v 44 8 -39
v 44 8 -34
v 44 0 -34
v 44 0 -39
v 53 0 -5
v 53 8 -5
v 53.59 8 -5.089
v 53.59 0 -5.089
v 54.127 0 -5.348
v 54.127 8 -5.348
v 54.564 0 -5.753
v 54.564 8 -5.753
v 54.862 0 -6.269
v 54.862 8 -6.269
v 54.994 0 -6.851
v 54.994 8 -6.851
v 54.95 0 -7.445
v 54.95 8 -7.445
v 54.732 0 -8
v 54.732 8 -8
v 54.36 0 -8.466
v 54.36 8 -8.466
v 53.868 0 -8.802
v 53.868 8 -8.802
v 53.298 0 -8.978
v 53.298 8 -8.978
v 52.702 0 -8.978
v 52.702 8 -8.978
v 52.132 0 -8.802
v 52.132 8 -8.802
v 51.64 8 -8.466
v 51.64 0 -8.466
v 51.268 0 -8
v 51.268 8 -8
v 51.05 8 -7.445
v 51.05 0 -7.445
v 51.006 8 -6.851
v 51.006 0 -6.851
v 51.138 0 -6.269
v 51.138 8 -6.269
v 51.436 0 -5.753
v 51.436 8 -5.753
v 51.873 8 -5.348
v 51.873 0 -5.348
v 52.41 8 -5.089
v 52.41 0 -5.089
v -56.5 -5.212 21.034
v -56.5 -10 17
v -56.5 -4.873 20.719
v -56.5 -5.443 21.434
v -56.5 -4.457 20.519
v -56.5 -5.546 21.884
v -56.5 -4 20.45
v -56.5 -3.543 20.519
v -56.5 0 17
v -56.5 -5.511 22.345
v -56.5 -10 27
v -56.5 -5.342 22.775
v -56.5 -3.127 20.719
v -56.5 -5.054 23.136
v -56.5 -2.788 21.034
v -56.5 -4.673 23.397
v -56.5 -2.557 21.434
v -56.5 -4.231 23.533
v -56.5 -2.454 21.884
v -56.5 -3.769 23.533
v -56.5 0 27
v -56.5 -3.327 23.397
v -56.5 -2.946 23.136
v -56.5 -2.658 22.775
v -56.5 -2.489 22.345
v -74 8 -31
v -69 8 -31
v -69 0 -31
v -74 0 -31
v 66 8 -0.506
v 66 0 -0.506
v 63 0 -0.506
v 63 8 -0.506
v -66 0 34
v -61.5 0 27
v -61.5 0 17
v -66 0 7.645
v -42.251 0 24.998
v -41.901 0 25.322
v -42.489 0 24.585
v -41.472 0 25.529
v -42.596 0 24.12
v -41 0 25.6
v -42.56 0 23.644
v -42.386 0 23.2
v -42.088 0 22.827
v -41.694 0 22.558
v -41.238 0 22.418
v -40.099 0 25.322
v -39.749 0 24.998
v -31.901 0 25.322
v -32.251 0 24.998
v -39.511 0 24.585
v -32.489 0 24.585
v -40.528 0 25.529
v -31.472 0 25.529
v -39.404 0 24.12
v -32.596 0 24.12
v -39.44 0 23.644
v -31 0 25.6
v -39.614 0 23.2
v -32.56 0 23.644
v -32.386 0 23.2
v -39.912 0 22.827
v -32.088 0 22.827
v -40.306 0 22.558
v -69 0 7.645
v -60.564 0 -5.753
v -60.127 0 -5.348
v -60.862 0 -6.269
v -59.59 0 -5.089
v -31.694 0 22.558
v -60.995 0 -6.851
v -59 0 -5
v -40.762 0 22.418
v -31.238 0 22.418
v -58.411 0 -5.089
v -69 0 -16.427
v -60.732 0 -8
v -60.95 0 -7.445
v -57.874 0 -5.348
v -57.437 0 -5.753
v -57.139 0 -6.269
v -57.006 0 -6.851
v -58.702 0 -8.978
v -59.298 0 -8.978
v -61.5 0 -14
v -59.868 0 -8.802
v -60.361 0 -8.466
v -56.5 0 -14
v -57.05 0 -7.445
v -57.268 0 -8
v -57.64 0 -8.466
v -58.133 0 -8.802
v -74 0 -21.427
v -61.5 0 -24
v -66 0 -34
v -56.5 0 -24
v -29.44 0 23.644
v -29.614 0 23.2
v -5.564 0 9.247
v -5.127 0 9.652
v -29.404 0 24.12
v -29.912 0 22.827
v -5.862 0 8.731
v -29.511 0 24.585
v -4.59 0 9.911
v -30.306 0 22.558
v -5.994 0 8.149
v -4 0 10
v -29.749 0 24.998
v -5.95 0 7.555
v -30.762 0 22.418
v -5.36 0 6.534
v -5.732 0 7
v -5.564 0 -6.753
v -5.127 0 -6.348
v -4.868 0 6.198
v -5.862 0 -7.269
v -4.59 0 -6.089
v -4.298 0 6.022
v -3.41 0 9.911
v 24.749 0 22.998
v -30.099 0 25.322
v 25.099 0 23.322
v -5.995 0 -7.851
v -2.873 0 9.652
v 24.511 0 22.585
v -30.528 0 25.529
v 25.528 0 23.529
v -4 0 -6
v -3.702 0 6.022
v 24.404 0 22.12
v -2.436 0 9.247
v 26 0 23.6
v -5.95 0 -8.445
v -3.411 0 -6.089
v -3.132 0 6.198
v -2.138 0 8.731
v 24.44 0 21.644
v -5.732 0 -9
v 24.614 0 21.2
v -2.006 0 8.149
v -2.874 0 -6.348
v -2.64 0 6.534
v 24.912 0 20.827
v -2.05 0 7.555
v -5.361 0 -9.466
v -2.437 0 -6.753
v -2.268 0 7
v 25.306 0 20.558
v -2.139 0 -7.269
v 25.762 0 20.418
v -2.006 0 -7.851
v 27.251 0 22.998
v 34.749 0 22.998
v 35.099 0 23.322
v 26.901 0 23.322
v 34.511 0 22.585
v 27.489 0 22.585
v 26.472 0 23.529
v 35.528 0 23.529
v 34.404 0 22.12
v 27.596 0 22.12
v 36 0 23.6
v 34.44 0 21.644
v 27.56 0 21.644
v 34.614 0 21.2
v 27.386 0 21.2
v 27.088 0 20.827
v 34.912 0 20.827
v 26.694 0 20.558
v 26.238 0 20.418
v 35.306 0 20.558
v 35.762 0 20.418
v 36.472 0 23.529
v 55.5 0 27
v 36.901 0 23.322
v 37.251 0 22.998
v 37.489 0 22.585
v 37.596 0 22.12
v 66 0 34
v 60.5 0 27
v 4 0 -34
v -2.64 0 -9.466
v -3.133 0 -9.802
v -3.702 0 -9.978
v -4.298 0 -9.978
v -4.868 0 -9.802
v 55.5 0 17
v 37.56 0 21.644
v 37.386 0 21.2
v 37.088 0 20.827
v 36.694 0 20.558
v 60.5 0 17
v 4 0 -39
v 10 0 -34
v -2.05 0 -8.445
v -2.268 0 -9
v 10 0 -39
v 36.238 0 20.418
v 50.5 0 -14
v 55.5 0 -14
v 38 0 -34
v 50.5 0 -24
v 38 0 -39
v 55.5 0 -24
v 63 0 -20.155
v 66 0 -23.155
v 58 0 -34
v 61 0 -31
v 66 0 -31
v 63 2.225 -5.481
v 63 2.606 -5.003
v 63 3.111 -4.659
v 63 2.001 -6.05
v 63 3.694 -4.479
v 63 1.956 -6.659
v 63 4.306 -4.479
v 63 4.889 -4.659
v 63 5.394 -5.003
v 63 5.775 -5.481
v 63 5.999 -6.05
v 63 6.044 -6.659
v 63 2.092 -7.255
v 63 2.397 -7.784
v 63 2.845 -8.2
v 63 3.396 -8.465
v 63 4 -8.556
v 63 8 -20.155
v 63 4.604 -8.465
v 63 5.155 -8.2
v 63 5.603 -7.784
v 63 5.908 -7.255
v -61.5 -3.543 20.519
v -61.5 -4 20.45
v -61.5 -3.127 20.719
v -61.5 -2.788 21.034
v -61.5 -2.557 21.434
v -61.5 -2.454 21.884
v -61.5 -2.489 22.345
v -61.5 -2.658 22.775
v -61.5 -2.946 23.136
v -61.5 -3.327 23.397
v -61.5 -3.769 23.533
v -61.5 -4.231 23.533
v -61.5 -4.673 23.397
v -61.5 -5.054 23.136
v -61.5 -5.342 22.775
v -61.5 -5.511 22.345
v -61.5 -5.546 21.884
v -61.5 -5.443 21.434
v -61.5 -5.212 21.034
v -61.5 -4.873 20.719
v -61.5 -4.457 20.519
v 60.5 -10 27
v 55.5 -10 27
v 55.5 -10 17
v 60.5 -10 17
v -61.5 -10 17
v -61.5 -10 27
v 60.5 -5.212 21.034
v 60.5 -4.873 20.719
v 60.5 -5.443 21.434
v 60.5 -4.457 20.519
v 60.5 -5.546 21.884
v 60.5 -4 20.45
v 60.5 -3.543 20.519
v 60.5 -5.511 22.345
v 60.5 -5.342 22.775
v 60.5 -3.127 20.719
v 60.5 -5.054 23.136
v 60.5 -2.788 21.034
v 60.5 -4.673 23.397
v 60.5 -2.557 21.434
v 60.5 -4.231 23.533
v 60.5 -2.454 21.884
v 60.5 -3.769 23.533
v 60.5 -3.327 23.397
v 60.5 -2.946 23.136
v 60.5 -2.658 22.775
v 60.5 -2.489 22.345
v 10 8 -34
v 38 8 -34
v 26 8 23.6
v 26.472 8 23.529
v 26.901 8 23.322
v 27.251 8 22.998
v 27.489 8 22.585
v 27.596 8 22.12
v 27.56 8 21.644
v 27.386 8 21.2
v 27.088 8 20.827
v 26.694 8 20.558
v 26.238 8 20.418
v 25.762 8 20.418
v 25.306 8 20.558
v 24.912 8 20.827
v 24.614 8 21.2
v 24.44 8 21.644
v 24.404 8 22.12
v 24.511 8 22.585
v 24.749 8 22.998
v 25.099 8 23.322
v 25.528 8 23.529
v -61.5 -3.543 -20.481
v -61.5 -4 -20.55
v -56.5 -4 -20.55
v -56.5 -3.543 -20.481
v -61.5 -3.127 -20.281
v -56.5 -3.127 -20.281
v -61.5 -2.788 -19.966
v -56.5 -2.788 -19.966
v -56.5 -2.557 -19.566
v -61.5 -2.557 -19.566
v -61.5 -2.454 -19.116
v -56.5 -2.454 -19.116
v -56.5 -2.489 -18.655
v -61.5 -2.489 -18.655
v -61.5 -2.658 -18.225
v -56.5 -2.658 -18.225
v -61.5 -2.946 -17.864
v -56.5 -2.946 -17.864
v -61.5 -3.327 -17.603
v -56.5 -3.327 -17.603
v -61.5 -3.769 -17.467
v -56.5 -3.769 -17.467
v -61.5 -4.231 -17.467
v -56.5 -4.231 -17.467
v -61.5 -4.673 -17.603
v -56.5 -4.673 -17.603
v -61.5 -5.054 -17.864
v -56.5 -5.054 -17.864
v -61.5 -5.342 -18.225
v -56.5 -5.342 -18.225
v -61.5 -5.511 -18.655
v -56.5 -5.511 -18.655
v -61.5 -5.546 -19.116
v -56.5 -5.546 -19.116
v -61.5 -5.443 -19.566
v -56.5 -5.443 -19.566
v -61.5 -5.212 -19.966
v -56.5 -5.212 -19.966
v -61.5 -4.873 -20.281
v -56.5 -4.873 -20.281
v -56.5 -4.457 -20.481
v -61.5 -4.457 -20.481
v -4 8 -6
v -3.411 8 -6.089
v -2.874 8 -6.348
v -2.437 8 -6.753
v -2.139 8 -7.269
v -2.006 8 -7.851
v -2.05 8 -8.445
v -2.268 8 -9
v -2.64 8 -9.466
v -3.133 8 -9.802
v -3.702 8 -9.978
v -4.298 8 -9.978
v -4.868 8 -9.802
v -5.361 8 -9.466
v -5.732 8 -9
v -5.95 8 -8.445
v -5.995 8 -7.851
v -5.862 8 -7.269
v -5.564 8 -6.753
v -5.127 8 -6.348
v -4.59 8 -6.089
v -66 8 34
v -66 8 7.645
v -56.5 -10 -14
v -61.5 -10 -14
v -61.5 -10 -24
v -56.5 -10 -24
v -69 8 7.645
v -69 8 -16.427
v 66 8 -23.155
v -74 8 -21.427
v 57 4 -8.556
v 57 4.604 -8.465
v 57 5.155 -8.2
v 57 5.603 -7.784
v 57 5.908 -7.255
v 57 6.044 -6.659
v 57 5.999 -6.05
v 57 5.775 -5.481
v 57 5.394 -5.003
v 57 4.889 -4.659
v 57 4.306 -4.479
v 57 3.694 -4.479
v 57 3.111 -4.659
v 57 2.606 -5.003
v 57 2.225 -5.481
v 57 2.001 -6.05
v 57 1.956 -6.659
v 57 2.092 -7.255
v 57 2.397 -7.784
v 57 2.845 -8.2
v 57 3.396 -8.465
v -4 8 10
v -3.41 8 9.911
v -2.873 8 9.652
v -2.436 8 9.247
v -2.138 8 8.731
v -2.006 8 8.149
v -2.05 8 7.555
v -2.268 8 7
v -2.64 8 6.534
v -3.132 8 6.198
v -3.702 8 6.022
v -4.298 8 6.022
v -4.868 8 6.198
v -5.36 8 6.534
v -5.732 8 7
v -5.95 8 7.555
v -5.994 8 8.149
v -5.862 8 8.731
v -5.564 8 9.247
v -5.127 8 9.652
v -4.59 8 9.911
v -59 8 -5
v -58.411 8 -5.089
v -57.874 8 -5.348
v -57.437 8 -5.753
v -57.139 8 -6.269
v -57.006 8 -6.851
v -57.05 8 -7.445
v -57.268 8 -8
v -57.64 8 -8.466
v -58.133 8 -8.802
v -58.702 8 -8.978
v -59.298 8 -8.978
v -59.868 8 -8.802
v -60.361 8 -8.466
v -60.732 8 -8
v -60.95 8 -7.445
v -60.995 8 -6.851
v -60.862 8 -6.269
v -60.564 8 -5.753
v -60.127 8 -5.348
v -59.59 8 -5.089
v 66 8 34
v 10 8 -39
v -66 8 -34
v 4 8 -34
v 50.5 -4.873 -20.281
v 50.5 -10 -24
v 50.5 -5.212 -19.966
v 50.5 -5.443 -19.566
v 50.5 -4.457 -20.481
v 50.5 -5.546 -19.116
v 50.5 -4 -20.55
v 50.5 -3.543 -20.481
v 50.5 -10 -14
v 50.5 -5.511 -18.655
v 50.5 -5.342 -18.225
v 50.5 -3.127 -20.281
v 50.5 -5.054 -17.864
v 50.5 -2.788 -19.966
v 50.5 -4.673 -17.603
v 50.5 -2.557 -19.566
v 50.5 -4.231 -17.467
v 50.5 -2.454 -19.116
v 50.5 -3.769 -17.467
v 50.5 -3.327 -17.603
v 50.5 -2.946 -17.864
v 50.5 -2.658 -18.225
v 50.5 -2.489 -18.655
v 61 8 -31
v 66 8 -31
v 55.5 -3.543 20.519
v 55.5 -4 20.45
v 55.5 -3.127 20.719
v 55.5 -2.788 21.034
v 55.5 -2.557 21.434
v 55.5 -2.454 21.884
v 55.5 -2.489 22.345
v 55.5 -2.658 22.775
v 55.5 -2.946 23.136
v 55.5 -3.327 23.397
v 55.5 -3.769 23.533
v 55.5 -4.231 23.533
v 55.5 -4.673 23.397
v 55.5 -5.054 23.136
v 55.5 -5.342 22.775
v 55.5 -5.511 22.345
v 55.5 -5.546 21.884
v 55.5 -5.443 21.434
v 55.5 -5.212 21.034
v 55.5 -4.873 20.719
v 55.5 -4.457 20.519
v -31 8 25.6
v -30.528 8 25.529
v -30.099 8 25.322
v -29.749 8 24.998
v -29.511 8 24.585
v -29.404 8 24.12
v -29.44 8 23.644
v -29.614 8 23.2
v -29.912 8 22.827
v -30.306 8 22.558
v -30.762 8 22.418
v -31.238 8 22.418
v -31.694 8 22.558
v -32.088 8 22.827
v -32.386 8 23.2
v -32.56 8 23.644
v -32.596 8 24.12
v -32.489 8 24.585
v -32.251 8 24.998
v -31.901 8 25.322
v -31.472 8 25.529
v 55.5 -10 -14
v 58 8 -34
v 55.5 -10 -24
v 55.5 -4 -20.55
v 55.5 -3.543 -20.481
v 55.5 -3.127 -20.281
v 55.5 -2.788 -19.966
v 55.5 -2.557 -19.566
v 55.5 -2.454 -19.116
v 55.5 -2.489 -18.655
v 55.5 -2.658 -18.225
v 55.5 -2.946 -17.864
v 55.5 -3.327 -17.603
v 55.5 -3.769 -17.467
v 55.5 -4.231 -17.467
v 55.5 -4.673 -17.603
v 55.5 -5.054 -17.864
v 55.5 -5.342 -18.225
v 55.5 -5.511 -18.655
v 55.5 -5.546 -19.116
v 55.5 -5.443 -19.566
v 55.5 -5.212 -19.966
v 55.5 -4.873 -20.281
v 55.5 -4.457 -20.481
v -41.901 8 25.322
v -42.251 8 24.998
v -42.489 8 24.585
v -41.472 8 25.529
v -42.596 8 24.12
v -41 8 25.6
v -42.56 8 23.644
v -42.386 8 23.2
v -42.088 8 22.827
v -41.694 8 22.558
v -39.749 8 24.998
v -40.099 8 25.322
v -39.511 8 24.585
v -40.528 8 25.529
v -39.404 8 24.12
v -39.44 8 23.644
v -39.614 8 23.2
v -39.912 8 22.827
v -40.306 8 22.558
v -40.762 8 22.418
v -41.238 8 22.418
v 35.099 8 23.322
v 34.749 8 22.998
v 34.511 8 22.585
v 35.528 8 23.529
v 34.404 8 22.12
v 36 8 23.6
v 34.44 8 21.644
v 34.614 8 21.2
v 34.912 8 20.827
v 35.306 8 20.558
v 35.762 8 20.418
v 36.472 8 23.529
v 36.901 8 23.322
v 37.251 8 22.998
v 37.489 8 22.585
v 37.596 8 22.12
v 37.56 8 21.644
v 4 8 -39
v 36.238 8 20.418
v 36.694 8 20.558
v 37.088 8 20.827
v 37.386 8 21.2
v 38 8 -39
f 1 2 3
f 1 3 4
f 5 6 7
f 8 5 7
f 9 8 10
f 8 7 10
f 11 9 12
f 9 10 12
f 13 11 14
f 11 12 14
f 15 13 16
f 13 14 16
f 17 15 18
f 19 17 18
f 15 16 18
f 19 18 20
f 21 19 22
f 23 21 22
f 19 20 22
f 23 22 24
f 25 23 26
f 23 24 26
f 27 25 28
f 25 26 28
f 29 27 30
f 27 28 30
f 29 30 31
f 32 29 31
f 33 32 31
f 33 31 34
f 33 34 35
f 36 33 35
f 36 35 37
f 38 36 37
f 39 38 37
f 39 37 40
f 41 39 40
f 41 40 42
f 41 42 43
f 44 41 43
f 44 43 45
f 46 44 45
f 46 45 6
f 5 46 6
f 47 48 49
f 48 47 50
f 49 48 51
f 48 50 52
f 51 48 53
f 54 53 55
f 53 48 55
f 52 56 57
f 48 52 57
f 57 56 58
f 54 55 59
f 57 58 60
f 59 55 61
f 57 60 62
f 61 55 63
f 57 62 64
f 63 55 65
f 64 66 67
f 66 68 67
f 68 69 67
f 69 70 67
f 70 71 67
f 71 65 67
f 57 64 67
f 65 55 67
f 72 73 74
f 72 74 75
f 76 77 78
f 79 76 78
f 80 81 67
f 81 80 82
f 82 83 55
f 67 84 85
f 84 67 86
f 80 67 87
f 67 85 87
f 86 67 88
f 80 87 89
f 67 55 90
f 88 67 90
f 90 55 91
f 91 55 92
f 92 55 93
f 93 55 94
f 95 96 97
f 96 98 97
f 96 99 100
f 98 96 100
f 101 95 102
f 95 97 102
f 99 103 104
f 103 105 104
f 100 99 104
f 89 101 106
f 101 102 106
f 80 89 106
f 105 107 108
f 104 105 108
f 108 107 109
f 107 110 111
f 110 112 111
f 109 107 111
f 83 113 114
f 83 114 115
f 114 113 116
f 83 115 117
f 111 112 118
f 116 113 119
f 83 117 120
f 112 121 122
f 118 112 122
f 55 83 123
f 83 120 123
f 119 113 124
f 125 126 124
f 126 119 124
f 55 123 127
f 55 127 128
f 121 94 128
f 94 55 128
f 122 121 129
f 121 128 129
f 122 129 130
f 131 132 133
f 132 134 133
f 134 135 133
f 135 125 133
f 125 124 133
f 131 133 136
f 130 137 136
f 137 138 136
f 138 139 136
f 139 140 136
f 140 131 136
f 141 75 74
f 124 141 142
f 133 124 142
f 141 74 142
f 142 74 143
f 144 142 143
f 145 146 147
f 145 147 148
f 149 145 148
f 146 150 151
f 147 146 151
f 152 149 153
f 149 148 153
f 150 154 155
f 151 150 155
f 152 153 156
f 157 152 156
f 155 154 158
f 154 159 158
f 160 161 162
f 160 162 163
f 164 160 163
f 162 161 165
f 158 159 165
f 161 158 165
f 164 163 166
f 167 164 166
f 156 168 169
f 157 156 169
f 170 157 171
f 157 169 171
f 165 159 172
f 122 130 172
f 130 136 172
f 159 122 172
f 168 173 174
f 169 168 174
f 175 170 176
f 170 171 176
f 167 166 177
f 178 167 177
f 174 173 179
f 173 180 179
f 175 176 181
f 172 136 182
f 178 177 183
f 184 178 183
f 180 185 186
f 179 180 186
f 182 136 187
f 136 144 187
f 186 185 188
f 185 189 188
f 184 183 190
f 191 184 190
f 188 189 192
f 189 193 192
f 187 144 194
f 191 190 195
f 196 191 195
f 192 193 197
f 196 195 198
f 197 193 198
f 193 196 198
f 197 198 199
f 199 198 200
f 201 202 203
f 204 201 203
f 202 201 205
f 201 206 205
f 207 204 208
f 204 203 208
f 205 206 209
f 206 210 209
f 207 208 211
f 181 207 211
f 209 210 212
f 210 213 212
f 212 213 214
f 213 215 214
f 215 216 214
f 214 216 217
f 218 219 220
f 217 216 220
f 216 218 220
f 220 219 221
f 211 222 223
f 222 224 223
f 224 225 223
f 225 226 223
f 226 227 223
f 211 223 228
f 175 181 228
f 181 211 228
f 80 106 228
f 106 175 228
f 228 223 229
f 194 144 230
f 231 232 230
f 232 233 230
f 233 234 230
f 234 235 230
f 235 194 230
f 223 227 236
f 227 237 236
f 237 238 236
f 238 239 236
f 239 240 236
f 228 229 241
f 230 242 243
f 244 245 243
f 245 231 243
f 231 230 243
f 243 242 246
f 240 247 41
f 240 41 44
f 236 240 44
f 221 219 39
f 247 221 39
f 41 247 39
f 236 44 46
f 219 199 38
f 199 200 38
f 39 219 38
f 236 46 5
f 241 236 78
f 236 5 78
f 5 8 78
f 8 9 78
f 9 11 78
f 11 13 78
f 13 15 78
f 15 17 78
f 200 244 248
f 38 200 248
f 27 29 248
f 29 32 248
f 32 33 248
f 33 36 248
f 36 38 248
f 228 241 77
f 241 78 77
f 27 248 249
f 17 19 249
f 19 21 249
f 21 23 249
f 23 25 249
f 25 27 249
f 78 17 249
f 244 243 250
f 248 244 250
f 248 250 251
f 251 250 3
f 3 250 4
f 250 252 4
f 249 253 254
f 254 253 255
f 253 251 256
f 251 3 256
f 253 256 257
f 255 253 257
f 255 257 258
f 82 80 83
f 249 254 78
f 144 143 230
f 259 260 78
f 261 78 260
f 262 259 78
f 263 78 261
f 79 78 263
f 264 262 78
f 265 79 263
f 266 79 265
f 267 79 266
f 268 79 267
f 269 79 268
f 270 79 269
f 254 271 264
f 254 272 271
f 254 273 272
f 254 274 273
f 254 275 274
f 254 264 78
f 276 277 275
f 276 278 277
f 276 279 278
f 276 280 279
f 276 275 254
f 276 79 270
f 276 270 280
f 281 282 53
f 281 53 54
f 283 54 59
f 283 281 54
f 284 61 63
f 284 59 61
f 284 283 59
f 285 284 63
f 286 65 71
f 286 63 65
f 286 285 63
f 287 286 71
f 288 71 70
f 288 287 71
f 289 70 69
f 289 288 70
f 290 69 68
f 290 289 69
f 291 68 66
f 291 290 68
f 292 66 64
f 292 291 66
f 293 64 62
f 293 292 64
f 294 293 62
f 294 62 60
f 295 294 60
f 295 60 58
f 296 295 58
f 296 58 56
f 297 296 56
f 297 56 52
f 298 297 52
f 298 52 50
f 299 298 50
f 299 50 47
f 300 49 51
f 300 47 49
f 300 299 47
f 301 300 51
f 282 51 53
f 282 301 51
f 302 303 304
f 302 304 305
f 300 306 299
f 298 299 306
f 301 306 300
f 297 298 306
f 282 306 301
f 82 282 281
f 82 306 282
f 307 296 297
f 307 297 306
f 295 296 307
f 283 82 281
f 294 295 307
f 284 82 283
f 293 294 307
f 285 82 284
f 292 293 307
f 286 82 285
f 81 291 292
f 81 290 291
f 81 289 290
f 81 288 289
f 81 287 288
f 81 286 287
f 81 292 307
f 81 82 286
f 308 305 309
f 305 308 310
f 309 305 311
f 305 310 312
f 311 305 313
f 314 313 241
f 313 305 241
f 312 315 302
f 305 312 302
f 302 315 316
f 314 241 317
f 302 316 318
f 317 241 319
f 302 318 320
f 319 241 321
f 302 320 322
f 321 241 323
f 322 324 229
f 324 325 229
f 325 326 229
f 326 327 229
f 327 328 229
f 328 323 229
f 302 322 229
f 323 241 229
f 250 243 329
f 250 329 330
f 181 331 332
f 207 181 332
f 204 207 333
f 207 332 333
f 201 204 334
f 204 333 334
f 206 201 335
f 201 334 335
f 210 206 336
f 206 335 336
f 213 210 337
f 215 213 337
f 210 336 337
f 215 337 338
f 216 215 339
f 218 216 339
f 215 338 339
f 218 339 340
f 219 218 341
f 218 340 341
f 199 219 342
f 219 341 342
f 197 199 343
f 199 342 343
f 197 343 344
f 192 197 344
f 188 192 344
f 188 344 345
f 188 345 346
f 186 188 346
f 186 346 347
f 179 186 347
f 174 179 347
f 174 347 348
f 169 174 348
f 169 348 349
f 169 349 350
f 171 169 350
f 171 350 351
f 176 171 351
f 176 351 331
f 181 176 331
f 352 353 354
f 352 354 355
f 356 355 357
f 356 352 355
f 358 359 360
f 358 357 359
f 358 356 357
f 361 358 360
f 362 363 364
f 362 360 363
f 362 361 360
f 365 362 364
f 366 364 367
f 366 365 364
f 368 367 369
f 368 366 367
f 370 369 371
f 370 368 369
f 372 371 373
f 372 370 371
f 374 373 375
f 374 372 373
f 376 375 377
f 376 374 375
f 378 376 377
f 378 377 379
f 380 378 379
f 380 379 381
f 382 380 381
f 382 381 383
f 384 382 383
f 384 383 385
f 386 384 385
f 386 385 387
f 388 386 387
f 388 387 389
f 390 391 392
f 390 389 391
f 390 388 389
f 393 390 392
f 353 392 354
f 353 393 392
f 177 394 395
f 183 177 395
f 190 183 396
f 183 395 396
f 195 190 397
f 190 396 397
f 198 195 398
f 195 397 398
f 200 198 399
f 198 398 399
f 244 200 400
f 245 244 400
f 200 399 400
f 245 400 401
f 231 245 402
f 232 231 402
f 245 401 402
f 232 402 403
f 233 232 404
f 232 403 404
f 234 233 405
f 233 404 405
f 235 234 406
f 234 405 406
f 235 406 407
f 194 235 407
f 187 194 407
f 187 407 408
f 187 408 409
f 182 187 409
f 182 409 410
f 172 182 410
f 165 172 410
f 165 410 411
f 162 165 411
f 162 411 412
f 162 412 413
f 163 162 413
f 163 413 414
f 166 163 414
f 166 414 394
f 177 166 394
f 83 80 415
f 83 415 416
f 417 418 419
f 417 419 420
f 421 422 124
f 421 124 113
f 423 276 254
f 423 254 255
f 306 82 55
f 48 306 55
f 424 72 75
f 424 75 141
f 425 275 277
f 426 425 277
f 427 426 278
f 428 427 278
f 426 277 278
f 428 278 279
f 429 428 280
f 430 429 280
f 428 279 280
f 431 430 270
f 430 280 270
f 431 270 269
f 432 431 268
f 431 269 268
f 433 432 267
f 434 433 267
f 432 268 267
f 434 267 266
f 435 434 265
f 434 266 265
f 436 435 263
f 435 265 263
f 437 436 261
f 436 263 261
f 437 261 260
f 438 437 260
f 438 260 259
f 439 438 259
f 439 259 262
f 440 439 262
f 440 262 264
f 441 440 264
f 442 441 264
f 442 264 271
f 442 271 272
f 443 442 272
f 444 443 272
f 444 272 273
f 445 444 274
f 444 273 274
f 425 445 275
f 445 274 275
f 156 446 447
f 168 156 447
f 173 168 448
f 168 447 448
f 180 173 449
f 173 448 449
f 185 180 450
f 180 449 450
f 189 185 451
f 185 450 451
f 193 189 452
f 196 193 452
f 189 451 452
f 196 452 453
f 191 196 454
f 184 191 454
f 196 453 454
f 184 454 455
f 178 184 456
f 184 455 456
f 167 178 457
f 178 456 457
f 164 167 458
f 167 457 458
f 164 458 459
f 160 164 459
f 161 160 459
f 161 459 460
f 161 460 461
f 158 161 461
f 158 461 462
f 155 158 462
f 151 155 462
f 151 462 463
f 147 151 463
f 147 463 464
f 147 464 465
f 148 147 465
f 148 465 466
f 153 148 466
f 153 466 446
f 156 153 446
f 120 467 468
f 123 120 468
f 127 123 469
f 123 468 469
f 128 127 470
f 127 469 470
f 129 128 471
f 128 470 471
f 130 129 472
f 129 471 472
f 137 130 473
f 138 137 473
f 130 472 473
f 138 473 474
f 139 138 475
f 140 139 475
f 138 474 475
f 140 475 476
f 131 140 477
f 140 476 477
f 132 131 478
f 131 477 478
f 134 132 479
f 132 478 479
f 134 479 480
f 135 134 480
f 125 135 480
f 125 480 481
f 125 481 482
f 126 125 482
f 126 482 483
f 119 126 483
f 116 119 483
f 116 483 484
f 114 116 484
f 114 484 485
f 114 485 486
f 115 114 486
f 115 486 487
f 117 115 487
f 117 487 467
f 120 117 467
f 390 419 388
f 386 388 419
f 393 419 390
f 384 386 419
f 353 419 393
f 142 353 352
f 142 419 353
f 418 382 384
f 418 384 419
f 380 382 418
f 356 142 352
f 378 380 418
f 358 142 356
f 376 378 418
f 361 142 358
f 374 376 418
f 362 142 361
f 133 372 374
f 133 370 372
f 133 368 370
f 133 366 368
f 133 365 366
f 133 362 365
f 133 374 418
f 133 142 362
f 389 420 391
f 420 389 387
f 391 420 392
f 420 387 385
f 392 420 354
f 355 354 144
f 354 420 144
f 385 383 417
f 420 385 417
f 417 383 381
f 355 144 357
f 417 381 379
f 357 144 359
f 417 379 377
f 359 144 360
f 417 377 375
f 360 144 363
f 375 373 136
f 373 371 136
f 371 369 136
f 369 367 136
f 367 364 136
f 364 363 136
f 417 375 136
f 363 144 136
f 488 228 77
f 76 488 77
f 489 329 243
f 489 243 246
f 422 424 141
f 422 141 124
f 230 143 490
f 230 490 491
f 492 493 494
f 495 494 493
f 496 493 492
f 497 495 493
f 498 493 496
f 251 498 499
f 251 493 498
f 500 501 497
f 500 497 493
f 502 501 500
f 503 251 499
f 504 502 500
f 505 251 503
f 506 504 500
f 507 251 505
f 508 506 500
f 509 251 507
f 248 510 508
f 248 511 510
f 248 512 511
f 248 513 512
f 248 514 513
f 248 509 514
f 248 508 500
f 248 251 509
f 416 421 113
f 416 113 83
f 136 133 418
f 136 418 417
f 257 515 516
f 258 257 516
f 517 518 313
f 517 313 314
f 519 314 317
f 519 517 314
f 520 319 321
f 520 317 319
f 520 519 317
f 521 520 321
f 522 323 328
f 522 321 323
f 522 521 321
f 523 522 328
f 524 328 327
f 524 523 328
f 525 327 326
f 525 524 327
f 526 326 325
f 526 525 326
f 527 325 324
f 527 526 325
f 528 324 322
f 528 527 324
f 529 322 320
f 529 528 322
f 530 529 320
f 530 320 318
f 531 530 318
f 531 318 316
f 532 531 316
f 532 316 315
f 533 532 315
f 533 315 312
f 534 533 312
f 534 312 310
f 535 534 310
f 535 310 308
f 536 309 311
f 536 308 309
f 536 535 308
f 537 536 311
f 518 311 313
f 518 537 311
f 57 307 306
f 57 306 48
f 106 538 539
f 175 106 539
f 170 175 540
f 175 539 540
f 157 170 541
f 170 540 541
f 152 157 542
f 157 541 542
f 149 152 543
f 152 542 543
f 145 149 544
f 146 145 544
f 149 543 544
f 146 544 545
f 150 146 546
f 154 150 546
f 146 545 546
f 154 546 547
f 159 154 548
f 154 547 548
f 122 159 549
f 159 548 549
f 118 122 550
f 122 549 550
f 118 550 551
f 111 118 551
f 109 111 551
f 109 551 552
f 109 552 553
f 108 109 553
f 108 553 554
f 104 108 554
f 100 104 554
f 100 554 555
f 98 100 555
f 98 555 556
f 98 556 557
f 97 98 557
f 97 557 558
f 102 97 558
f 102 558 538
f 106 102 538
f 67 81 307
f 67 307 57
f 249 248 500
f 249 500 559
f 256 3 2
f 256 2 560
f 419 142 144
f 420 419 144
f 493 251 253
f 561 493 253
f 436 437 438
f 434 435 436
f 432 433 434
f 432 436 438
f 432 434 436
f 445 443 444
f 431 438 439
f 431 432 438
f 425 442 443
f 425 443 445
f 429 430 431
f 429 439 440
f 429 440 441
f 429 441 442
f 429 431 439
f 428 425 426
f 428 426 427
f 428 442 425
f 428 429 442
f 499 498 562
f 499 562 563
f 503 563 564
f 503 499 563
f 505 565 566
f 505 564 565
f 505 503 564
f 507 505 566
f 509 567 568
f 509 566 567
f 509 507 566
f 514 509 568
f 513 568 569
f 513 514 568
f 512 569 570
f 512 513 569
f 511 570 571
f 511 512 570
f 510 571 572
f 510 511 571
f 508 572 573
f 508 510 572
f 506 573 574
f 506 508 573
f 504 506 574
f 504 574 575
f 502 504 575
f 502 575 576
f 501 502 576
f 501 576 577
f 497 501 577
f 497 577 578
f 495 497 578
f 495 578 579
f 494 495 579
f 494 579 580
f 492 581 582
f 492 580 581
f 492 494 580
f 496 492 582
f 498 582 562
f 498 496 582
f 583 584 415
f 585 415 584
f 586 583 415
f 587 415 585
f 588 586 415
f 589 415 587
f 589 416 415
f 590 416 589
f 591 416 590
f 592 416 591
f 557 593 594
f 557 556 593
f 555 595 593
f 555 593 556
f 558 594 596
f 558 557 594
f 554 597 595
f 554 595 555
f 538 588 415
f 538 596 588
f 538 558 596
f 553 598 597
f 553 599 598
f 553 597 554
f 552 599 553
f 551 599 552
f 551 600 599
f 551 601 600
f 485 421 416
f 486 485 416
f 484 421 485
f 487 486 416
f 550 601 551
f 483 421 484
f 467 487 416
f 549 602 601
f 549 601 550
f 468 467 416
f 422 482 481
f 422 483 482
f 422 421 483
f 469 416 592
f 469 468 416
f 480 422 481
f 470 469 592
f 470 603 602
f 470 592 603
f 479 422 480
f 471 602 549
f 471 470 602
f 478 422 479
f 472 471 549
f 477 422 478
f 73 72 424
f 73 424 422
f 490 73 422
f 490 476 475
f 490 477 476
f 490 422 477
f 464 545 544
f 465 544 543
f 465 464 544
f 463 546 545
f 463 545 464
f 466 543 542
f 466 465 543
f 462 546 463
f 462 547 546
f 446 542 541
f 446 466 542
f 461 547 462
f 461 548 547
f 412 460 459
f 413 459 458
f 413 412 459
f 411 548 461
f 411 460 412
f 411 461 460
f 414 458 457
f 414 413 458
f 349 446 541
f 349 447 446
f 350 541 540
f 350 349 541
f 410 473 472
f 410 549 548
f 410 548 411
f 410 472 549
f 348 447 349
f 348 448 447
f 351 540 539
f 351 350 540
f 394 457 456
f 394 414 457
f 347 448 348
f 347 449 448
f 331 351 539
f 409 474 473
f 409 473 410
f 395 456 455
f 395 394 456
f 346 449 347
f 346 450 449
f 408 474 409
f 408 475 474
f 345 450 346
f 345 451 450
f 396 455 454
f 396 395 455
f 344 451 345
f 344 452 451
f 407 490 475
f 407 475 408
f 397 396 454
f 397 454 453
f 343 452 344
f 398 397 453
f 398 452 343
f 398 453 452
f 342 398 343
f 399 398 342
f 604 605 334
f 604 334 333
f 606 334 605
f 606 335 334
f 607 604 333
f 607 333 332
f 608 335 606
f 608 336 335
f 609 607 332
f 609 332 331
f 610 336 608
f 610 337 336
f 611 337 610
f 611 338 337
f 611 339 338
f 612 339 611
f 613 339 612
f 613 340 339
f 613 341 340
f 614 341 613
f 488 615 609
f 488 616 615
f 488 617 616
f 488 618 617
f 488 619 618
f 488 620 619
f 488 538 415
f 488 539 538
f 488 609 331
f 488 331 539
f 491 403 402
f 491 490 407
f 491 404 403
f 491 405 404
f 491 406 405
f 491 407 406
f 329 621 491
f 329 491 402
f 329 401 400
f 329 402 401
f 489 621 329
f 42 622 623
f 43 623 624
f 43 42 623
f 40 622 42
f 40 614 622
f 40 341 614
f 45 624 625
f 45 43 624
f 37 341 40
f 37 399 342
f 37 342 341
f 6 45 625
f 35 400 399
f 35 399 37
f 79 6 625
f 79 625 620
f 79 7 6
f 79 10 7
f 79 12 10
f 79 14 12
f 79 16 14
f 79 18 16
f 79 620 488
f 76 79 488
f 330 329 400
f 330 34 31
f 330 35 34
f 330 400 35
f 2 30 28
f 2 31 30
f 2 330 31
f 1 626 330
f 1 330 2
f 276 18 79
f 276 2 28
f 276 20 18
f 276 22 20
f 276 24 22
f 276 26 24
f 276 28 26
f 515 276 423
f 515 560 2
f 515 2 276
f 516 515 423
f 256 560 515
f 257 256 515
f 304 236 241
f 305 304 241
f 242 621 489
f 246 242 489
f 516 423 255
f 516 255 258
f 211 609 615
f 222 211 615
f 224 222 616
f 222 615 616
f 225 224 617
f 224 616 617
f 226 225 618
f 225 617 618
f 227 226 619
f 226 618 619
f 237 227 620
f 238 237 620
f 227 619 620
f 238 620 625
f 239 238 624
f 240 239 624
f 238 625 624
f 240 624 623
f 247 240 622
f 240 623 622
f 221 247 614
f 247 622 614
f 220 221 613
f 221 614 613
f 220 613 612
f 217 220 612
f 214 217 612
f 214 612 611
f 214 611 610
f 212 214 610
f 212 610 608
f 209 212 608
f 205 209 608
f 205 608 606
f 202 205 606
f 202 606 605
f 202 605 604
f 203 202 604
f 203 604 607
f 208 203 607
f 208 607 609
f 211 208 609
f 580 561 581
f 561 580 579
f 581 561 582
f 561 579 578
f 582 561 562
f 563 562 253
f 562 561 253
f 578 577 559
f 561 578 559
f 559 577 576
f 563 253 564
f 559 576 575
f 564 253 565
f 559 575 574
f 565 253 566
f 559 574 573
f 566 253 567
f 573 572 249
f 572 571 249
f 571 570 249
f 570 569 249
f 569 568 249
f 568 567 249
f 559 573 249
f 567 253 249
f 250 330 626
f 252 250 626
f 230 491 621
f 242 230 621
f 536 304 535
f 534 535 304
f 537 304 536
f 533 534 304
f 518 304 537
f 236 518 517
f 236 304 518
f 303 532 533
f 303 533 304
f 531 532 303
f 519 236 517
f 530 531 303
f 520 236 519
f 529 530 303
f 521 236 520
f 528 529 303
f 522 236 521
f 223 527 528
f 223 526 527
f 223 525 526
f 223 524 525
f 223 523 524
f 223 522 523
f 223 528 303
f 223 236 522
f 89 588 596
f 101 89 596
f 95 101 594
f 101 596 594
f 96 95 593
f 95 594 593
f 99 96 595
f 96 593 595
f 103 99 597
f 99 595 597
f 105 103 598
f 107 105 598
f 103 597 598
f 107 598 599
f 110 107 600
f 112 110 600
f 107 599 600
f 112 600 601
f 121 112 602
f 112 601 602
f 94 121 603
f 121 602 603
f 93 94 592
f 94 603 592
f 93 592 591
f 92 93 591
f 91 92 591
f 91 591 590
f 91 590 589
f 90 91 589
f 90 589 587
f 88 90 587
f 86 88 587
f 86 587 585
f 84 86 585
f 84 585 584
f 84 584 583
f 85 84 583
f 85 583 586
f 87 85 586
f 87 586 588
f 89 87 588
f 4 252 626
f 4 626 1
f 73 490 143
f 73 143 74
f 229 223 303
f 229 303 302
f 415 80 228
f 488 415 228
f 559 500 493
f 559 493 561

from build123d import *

# Parameters (mm, degrees)
CROQUIS1_W                 = 132
CROQUIS1_H                 = 68
SALIENTE_EXTRUIR1_DEPTH    = 8
CORTAR_EXTRUIR1_DEPTH      = 8
CROQUIS3_W                 = 6
CROQUIS3_H                 = 5
SALIENTE_EXTRUIR2_DEPTH    = 8
CROQUIS4_R                 = 2
CROQUIS4_R_2               = 1.6
CORTAR_EXTRUIR2_DEPTH      = 85.029980381
CROQUIS5_R                 = 2.05
CORTAR_EXTRUIR3_DEPTH      = 6
CROQUIS6_W                 = 5
CROQUIS6_H                 = 10
SALIENTE_EXTRUIR3_DEPTH    = 10
CORTAR_EXTRUIR4_DEPTH      = 136.614342899
CORTAR_EXTRUIR4_DEPTH_BACK = 136.614342899
CROQUIS7_R                 = 1.55


with BuildPart() as part:
    # Croquis1 → Saliente-Extruir1 (new body)
    with BuildSketch(Plane(origin=(0, 0, 0), x_dir=(1, 0, 0), z_dir=(0, 1, 0))):
        Rectangle(CROQUIS1_W, CROQUIS1_H)
    extrude(amount=SALIENTE_EXTRUIR1_DEPTH)

    # Croquis2 → Cortar-Extruir1 (cut)
    with BuildSketch(Plane(origin=(0, 8, 0), x_dir=(1, 0, 0), z_dir=(0, 1, 0))):
        Polygon((61, 31.000254068), (66, 31.000254068), (66, 34), (58.000254068, 34), align=None)
        Polygon((66.000254073, 23.155254073), (66, 0.506), (63, 0.506), (63, 20.155), align=None)
    extrude(amount=-CORTAR_EXTRUIR1_DEPTH, mode=Mode.SUBTRACT)

    # Croquis3 → Saliente-Extruir2 (add)
    with BuildSketch(Plane(origin=(0, 8, 0), x_dir=(1, 0, 0), z_dir=(0, 1, 0))):
        with Locations((41.000254068, 36.5)):
            Rectangle(CROQUIS3_W, CROQUIS3_H)
        with Locations((7.000254068, 36.5)):
            Rectangle(CROQUIS3_W, CROQUIS3_H)
        Polygon((-66, 34), (-69.000254073, 30.999745927), (-74.000254073, 30.999745927), (-74.000254073, 21.426745927), (-69.000302023, 16.426793878), (-69.000302023, -7.645206122), (-66, -7.645206122), align=None)
    extrude(amount=-SALIENTE_EXTRUIR2_DEPTH)

    # Croquis4 → Cortar-Extruir2 (cut, through all)
    with BuildSketch(Plane(origin=(0, 8, 0), x_dir=(1, 0, 0), z_dir=(0, 1, 0))):
        with Locations(Location((-59.000302023, 7, 0), (0, 0, 270))):
            Circle(CROQUIS4_R)
        with Locations(Location((-41, -24, 0), (0, 0, 270))):
            Circle(CROQUIS4_R_2)
        with Locations(Location((-31, -24, 0), (0, 0, 270))):
            Circle(CROQUIS4_R_2)
        with Locations(Location((-4.000302023, 8, 0), (0, 0, 270))):
            Circle(CROQUIS4_R)
        with Locations(Location((-4, -7.999999997, 0), (0, 0, 270))):
            Circle(CROQUIS4_R)
        with Locations(Location((26, -22, 0), (0, 0, 270))):
            Circle(CROQUIS4_R_2)
        with Locations(Location((36, -22, 0), (0, 0, 270))):
            Circle(CROQUIS4_R_2)
        with Locations(Location((53, 7, 0), (0, 0, 270))):
            Circle(CROQUIS4_R)
    extrude(amount=-CORTAR_EXTRUIR2_DEPTH, mode=Mode.SUBTRACT)

    # Croquis5 → Cortar-Extruir3 (cut)
    with BuildSketch(Plane(origin=(63, 0, 0), x_dir=(0, 0, -1), z_dir=(1, 0, 0))):
        with Locations((6.506, 4)):
            Circle(CROQUIS5_R)
    extrude(amount=-CORTAR_EXTRUIR3_DEPTH, mode=Mode.SUBTRACT)

    # Croquis6 → Saliente-Extruir3 (add)
    with BuildSketch(Plane.XZ):
        with Locations((-59.000254073, -19)):
            Rectangle(CROQUIS6_W, CROQUIS6_H)
        with Locations((-59.000254073, 22)):
            Rectangle(CROQUIS6_W, CROQUIS6_H)
        with Locations((57.999745927, 22)):
            Rectangle(CROQUIS6_W, CROQUIS6_H)
        with Locations((52.999745927, -19)):
            Rectangle(CROQUIS6_W, CROQUIS6_H)
    extrude(amount=SALIENTE_EXTRUIR3_DEPTH)

    # Croquis7 → Cortar-Extruir4 (cut, two sides: drawn at the far end of the back side and taken through both)
    with BuildSketch(Plane(origin=(55.499745927, 0, 0), x_dir=(0, 0, -1), z_dir=(1, 0, 0)).offset(-CORTAR_EXTRUIR4_DEPTH_BACK)):
        with Locations((19, -4)):
            Circle(CROQUIS7_R)
        with Locations((-22, -4)):
            Circle(CROQUIS7_R)
    extrude(amount=CORTAR_EXTRUIR4_DEPTH + CORTAR_EXTRUIR4_DEPTH_BACK, mode=Mode.SUBTRACT)


solid = part.part
